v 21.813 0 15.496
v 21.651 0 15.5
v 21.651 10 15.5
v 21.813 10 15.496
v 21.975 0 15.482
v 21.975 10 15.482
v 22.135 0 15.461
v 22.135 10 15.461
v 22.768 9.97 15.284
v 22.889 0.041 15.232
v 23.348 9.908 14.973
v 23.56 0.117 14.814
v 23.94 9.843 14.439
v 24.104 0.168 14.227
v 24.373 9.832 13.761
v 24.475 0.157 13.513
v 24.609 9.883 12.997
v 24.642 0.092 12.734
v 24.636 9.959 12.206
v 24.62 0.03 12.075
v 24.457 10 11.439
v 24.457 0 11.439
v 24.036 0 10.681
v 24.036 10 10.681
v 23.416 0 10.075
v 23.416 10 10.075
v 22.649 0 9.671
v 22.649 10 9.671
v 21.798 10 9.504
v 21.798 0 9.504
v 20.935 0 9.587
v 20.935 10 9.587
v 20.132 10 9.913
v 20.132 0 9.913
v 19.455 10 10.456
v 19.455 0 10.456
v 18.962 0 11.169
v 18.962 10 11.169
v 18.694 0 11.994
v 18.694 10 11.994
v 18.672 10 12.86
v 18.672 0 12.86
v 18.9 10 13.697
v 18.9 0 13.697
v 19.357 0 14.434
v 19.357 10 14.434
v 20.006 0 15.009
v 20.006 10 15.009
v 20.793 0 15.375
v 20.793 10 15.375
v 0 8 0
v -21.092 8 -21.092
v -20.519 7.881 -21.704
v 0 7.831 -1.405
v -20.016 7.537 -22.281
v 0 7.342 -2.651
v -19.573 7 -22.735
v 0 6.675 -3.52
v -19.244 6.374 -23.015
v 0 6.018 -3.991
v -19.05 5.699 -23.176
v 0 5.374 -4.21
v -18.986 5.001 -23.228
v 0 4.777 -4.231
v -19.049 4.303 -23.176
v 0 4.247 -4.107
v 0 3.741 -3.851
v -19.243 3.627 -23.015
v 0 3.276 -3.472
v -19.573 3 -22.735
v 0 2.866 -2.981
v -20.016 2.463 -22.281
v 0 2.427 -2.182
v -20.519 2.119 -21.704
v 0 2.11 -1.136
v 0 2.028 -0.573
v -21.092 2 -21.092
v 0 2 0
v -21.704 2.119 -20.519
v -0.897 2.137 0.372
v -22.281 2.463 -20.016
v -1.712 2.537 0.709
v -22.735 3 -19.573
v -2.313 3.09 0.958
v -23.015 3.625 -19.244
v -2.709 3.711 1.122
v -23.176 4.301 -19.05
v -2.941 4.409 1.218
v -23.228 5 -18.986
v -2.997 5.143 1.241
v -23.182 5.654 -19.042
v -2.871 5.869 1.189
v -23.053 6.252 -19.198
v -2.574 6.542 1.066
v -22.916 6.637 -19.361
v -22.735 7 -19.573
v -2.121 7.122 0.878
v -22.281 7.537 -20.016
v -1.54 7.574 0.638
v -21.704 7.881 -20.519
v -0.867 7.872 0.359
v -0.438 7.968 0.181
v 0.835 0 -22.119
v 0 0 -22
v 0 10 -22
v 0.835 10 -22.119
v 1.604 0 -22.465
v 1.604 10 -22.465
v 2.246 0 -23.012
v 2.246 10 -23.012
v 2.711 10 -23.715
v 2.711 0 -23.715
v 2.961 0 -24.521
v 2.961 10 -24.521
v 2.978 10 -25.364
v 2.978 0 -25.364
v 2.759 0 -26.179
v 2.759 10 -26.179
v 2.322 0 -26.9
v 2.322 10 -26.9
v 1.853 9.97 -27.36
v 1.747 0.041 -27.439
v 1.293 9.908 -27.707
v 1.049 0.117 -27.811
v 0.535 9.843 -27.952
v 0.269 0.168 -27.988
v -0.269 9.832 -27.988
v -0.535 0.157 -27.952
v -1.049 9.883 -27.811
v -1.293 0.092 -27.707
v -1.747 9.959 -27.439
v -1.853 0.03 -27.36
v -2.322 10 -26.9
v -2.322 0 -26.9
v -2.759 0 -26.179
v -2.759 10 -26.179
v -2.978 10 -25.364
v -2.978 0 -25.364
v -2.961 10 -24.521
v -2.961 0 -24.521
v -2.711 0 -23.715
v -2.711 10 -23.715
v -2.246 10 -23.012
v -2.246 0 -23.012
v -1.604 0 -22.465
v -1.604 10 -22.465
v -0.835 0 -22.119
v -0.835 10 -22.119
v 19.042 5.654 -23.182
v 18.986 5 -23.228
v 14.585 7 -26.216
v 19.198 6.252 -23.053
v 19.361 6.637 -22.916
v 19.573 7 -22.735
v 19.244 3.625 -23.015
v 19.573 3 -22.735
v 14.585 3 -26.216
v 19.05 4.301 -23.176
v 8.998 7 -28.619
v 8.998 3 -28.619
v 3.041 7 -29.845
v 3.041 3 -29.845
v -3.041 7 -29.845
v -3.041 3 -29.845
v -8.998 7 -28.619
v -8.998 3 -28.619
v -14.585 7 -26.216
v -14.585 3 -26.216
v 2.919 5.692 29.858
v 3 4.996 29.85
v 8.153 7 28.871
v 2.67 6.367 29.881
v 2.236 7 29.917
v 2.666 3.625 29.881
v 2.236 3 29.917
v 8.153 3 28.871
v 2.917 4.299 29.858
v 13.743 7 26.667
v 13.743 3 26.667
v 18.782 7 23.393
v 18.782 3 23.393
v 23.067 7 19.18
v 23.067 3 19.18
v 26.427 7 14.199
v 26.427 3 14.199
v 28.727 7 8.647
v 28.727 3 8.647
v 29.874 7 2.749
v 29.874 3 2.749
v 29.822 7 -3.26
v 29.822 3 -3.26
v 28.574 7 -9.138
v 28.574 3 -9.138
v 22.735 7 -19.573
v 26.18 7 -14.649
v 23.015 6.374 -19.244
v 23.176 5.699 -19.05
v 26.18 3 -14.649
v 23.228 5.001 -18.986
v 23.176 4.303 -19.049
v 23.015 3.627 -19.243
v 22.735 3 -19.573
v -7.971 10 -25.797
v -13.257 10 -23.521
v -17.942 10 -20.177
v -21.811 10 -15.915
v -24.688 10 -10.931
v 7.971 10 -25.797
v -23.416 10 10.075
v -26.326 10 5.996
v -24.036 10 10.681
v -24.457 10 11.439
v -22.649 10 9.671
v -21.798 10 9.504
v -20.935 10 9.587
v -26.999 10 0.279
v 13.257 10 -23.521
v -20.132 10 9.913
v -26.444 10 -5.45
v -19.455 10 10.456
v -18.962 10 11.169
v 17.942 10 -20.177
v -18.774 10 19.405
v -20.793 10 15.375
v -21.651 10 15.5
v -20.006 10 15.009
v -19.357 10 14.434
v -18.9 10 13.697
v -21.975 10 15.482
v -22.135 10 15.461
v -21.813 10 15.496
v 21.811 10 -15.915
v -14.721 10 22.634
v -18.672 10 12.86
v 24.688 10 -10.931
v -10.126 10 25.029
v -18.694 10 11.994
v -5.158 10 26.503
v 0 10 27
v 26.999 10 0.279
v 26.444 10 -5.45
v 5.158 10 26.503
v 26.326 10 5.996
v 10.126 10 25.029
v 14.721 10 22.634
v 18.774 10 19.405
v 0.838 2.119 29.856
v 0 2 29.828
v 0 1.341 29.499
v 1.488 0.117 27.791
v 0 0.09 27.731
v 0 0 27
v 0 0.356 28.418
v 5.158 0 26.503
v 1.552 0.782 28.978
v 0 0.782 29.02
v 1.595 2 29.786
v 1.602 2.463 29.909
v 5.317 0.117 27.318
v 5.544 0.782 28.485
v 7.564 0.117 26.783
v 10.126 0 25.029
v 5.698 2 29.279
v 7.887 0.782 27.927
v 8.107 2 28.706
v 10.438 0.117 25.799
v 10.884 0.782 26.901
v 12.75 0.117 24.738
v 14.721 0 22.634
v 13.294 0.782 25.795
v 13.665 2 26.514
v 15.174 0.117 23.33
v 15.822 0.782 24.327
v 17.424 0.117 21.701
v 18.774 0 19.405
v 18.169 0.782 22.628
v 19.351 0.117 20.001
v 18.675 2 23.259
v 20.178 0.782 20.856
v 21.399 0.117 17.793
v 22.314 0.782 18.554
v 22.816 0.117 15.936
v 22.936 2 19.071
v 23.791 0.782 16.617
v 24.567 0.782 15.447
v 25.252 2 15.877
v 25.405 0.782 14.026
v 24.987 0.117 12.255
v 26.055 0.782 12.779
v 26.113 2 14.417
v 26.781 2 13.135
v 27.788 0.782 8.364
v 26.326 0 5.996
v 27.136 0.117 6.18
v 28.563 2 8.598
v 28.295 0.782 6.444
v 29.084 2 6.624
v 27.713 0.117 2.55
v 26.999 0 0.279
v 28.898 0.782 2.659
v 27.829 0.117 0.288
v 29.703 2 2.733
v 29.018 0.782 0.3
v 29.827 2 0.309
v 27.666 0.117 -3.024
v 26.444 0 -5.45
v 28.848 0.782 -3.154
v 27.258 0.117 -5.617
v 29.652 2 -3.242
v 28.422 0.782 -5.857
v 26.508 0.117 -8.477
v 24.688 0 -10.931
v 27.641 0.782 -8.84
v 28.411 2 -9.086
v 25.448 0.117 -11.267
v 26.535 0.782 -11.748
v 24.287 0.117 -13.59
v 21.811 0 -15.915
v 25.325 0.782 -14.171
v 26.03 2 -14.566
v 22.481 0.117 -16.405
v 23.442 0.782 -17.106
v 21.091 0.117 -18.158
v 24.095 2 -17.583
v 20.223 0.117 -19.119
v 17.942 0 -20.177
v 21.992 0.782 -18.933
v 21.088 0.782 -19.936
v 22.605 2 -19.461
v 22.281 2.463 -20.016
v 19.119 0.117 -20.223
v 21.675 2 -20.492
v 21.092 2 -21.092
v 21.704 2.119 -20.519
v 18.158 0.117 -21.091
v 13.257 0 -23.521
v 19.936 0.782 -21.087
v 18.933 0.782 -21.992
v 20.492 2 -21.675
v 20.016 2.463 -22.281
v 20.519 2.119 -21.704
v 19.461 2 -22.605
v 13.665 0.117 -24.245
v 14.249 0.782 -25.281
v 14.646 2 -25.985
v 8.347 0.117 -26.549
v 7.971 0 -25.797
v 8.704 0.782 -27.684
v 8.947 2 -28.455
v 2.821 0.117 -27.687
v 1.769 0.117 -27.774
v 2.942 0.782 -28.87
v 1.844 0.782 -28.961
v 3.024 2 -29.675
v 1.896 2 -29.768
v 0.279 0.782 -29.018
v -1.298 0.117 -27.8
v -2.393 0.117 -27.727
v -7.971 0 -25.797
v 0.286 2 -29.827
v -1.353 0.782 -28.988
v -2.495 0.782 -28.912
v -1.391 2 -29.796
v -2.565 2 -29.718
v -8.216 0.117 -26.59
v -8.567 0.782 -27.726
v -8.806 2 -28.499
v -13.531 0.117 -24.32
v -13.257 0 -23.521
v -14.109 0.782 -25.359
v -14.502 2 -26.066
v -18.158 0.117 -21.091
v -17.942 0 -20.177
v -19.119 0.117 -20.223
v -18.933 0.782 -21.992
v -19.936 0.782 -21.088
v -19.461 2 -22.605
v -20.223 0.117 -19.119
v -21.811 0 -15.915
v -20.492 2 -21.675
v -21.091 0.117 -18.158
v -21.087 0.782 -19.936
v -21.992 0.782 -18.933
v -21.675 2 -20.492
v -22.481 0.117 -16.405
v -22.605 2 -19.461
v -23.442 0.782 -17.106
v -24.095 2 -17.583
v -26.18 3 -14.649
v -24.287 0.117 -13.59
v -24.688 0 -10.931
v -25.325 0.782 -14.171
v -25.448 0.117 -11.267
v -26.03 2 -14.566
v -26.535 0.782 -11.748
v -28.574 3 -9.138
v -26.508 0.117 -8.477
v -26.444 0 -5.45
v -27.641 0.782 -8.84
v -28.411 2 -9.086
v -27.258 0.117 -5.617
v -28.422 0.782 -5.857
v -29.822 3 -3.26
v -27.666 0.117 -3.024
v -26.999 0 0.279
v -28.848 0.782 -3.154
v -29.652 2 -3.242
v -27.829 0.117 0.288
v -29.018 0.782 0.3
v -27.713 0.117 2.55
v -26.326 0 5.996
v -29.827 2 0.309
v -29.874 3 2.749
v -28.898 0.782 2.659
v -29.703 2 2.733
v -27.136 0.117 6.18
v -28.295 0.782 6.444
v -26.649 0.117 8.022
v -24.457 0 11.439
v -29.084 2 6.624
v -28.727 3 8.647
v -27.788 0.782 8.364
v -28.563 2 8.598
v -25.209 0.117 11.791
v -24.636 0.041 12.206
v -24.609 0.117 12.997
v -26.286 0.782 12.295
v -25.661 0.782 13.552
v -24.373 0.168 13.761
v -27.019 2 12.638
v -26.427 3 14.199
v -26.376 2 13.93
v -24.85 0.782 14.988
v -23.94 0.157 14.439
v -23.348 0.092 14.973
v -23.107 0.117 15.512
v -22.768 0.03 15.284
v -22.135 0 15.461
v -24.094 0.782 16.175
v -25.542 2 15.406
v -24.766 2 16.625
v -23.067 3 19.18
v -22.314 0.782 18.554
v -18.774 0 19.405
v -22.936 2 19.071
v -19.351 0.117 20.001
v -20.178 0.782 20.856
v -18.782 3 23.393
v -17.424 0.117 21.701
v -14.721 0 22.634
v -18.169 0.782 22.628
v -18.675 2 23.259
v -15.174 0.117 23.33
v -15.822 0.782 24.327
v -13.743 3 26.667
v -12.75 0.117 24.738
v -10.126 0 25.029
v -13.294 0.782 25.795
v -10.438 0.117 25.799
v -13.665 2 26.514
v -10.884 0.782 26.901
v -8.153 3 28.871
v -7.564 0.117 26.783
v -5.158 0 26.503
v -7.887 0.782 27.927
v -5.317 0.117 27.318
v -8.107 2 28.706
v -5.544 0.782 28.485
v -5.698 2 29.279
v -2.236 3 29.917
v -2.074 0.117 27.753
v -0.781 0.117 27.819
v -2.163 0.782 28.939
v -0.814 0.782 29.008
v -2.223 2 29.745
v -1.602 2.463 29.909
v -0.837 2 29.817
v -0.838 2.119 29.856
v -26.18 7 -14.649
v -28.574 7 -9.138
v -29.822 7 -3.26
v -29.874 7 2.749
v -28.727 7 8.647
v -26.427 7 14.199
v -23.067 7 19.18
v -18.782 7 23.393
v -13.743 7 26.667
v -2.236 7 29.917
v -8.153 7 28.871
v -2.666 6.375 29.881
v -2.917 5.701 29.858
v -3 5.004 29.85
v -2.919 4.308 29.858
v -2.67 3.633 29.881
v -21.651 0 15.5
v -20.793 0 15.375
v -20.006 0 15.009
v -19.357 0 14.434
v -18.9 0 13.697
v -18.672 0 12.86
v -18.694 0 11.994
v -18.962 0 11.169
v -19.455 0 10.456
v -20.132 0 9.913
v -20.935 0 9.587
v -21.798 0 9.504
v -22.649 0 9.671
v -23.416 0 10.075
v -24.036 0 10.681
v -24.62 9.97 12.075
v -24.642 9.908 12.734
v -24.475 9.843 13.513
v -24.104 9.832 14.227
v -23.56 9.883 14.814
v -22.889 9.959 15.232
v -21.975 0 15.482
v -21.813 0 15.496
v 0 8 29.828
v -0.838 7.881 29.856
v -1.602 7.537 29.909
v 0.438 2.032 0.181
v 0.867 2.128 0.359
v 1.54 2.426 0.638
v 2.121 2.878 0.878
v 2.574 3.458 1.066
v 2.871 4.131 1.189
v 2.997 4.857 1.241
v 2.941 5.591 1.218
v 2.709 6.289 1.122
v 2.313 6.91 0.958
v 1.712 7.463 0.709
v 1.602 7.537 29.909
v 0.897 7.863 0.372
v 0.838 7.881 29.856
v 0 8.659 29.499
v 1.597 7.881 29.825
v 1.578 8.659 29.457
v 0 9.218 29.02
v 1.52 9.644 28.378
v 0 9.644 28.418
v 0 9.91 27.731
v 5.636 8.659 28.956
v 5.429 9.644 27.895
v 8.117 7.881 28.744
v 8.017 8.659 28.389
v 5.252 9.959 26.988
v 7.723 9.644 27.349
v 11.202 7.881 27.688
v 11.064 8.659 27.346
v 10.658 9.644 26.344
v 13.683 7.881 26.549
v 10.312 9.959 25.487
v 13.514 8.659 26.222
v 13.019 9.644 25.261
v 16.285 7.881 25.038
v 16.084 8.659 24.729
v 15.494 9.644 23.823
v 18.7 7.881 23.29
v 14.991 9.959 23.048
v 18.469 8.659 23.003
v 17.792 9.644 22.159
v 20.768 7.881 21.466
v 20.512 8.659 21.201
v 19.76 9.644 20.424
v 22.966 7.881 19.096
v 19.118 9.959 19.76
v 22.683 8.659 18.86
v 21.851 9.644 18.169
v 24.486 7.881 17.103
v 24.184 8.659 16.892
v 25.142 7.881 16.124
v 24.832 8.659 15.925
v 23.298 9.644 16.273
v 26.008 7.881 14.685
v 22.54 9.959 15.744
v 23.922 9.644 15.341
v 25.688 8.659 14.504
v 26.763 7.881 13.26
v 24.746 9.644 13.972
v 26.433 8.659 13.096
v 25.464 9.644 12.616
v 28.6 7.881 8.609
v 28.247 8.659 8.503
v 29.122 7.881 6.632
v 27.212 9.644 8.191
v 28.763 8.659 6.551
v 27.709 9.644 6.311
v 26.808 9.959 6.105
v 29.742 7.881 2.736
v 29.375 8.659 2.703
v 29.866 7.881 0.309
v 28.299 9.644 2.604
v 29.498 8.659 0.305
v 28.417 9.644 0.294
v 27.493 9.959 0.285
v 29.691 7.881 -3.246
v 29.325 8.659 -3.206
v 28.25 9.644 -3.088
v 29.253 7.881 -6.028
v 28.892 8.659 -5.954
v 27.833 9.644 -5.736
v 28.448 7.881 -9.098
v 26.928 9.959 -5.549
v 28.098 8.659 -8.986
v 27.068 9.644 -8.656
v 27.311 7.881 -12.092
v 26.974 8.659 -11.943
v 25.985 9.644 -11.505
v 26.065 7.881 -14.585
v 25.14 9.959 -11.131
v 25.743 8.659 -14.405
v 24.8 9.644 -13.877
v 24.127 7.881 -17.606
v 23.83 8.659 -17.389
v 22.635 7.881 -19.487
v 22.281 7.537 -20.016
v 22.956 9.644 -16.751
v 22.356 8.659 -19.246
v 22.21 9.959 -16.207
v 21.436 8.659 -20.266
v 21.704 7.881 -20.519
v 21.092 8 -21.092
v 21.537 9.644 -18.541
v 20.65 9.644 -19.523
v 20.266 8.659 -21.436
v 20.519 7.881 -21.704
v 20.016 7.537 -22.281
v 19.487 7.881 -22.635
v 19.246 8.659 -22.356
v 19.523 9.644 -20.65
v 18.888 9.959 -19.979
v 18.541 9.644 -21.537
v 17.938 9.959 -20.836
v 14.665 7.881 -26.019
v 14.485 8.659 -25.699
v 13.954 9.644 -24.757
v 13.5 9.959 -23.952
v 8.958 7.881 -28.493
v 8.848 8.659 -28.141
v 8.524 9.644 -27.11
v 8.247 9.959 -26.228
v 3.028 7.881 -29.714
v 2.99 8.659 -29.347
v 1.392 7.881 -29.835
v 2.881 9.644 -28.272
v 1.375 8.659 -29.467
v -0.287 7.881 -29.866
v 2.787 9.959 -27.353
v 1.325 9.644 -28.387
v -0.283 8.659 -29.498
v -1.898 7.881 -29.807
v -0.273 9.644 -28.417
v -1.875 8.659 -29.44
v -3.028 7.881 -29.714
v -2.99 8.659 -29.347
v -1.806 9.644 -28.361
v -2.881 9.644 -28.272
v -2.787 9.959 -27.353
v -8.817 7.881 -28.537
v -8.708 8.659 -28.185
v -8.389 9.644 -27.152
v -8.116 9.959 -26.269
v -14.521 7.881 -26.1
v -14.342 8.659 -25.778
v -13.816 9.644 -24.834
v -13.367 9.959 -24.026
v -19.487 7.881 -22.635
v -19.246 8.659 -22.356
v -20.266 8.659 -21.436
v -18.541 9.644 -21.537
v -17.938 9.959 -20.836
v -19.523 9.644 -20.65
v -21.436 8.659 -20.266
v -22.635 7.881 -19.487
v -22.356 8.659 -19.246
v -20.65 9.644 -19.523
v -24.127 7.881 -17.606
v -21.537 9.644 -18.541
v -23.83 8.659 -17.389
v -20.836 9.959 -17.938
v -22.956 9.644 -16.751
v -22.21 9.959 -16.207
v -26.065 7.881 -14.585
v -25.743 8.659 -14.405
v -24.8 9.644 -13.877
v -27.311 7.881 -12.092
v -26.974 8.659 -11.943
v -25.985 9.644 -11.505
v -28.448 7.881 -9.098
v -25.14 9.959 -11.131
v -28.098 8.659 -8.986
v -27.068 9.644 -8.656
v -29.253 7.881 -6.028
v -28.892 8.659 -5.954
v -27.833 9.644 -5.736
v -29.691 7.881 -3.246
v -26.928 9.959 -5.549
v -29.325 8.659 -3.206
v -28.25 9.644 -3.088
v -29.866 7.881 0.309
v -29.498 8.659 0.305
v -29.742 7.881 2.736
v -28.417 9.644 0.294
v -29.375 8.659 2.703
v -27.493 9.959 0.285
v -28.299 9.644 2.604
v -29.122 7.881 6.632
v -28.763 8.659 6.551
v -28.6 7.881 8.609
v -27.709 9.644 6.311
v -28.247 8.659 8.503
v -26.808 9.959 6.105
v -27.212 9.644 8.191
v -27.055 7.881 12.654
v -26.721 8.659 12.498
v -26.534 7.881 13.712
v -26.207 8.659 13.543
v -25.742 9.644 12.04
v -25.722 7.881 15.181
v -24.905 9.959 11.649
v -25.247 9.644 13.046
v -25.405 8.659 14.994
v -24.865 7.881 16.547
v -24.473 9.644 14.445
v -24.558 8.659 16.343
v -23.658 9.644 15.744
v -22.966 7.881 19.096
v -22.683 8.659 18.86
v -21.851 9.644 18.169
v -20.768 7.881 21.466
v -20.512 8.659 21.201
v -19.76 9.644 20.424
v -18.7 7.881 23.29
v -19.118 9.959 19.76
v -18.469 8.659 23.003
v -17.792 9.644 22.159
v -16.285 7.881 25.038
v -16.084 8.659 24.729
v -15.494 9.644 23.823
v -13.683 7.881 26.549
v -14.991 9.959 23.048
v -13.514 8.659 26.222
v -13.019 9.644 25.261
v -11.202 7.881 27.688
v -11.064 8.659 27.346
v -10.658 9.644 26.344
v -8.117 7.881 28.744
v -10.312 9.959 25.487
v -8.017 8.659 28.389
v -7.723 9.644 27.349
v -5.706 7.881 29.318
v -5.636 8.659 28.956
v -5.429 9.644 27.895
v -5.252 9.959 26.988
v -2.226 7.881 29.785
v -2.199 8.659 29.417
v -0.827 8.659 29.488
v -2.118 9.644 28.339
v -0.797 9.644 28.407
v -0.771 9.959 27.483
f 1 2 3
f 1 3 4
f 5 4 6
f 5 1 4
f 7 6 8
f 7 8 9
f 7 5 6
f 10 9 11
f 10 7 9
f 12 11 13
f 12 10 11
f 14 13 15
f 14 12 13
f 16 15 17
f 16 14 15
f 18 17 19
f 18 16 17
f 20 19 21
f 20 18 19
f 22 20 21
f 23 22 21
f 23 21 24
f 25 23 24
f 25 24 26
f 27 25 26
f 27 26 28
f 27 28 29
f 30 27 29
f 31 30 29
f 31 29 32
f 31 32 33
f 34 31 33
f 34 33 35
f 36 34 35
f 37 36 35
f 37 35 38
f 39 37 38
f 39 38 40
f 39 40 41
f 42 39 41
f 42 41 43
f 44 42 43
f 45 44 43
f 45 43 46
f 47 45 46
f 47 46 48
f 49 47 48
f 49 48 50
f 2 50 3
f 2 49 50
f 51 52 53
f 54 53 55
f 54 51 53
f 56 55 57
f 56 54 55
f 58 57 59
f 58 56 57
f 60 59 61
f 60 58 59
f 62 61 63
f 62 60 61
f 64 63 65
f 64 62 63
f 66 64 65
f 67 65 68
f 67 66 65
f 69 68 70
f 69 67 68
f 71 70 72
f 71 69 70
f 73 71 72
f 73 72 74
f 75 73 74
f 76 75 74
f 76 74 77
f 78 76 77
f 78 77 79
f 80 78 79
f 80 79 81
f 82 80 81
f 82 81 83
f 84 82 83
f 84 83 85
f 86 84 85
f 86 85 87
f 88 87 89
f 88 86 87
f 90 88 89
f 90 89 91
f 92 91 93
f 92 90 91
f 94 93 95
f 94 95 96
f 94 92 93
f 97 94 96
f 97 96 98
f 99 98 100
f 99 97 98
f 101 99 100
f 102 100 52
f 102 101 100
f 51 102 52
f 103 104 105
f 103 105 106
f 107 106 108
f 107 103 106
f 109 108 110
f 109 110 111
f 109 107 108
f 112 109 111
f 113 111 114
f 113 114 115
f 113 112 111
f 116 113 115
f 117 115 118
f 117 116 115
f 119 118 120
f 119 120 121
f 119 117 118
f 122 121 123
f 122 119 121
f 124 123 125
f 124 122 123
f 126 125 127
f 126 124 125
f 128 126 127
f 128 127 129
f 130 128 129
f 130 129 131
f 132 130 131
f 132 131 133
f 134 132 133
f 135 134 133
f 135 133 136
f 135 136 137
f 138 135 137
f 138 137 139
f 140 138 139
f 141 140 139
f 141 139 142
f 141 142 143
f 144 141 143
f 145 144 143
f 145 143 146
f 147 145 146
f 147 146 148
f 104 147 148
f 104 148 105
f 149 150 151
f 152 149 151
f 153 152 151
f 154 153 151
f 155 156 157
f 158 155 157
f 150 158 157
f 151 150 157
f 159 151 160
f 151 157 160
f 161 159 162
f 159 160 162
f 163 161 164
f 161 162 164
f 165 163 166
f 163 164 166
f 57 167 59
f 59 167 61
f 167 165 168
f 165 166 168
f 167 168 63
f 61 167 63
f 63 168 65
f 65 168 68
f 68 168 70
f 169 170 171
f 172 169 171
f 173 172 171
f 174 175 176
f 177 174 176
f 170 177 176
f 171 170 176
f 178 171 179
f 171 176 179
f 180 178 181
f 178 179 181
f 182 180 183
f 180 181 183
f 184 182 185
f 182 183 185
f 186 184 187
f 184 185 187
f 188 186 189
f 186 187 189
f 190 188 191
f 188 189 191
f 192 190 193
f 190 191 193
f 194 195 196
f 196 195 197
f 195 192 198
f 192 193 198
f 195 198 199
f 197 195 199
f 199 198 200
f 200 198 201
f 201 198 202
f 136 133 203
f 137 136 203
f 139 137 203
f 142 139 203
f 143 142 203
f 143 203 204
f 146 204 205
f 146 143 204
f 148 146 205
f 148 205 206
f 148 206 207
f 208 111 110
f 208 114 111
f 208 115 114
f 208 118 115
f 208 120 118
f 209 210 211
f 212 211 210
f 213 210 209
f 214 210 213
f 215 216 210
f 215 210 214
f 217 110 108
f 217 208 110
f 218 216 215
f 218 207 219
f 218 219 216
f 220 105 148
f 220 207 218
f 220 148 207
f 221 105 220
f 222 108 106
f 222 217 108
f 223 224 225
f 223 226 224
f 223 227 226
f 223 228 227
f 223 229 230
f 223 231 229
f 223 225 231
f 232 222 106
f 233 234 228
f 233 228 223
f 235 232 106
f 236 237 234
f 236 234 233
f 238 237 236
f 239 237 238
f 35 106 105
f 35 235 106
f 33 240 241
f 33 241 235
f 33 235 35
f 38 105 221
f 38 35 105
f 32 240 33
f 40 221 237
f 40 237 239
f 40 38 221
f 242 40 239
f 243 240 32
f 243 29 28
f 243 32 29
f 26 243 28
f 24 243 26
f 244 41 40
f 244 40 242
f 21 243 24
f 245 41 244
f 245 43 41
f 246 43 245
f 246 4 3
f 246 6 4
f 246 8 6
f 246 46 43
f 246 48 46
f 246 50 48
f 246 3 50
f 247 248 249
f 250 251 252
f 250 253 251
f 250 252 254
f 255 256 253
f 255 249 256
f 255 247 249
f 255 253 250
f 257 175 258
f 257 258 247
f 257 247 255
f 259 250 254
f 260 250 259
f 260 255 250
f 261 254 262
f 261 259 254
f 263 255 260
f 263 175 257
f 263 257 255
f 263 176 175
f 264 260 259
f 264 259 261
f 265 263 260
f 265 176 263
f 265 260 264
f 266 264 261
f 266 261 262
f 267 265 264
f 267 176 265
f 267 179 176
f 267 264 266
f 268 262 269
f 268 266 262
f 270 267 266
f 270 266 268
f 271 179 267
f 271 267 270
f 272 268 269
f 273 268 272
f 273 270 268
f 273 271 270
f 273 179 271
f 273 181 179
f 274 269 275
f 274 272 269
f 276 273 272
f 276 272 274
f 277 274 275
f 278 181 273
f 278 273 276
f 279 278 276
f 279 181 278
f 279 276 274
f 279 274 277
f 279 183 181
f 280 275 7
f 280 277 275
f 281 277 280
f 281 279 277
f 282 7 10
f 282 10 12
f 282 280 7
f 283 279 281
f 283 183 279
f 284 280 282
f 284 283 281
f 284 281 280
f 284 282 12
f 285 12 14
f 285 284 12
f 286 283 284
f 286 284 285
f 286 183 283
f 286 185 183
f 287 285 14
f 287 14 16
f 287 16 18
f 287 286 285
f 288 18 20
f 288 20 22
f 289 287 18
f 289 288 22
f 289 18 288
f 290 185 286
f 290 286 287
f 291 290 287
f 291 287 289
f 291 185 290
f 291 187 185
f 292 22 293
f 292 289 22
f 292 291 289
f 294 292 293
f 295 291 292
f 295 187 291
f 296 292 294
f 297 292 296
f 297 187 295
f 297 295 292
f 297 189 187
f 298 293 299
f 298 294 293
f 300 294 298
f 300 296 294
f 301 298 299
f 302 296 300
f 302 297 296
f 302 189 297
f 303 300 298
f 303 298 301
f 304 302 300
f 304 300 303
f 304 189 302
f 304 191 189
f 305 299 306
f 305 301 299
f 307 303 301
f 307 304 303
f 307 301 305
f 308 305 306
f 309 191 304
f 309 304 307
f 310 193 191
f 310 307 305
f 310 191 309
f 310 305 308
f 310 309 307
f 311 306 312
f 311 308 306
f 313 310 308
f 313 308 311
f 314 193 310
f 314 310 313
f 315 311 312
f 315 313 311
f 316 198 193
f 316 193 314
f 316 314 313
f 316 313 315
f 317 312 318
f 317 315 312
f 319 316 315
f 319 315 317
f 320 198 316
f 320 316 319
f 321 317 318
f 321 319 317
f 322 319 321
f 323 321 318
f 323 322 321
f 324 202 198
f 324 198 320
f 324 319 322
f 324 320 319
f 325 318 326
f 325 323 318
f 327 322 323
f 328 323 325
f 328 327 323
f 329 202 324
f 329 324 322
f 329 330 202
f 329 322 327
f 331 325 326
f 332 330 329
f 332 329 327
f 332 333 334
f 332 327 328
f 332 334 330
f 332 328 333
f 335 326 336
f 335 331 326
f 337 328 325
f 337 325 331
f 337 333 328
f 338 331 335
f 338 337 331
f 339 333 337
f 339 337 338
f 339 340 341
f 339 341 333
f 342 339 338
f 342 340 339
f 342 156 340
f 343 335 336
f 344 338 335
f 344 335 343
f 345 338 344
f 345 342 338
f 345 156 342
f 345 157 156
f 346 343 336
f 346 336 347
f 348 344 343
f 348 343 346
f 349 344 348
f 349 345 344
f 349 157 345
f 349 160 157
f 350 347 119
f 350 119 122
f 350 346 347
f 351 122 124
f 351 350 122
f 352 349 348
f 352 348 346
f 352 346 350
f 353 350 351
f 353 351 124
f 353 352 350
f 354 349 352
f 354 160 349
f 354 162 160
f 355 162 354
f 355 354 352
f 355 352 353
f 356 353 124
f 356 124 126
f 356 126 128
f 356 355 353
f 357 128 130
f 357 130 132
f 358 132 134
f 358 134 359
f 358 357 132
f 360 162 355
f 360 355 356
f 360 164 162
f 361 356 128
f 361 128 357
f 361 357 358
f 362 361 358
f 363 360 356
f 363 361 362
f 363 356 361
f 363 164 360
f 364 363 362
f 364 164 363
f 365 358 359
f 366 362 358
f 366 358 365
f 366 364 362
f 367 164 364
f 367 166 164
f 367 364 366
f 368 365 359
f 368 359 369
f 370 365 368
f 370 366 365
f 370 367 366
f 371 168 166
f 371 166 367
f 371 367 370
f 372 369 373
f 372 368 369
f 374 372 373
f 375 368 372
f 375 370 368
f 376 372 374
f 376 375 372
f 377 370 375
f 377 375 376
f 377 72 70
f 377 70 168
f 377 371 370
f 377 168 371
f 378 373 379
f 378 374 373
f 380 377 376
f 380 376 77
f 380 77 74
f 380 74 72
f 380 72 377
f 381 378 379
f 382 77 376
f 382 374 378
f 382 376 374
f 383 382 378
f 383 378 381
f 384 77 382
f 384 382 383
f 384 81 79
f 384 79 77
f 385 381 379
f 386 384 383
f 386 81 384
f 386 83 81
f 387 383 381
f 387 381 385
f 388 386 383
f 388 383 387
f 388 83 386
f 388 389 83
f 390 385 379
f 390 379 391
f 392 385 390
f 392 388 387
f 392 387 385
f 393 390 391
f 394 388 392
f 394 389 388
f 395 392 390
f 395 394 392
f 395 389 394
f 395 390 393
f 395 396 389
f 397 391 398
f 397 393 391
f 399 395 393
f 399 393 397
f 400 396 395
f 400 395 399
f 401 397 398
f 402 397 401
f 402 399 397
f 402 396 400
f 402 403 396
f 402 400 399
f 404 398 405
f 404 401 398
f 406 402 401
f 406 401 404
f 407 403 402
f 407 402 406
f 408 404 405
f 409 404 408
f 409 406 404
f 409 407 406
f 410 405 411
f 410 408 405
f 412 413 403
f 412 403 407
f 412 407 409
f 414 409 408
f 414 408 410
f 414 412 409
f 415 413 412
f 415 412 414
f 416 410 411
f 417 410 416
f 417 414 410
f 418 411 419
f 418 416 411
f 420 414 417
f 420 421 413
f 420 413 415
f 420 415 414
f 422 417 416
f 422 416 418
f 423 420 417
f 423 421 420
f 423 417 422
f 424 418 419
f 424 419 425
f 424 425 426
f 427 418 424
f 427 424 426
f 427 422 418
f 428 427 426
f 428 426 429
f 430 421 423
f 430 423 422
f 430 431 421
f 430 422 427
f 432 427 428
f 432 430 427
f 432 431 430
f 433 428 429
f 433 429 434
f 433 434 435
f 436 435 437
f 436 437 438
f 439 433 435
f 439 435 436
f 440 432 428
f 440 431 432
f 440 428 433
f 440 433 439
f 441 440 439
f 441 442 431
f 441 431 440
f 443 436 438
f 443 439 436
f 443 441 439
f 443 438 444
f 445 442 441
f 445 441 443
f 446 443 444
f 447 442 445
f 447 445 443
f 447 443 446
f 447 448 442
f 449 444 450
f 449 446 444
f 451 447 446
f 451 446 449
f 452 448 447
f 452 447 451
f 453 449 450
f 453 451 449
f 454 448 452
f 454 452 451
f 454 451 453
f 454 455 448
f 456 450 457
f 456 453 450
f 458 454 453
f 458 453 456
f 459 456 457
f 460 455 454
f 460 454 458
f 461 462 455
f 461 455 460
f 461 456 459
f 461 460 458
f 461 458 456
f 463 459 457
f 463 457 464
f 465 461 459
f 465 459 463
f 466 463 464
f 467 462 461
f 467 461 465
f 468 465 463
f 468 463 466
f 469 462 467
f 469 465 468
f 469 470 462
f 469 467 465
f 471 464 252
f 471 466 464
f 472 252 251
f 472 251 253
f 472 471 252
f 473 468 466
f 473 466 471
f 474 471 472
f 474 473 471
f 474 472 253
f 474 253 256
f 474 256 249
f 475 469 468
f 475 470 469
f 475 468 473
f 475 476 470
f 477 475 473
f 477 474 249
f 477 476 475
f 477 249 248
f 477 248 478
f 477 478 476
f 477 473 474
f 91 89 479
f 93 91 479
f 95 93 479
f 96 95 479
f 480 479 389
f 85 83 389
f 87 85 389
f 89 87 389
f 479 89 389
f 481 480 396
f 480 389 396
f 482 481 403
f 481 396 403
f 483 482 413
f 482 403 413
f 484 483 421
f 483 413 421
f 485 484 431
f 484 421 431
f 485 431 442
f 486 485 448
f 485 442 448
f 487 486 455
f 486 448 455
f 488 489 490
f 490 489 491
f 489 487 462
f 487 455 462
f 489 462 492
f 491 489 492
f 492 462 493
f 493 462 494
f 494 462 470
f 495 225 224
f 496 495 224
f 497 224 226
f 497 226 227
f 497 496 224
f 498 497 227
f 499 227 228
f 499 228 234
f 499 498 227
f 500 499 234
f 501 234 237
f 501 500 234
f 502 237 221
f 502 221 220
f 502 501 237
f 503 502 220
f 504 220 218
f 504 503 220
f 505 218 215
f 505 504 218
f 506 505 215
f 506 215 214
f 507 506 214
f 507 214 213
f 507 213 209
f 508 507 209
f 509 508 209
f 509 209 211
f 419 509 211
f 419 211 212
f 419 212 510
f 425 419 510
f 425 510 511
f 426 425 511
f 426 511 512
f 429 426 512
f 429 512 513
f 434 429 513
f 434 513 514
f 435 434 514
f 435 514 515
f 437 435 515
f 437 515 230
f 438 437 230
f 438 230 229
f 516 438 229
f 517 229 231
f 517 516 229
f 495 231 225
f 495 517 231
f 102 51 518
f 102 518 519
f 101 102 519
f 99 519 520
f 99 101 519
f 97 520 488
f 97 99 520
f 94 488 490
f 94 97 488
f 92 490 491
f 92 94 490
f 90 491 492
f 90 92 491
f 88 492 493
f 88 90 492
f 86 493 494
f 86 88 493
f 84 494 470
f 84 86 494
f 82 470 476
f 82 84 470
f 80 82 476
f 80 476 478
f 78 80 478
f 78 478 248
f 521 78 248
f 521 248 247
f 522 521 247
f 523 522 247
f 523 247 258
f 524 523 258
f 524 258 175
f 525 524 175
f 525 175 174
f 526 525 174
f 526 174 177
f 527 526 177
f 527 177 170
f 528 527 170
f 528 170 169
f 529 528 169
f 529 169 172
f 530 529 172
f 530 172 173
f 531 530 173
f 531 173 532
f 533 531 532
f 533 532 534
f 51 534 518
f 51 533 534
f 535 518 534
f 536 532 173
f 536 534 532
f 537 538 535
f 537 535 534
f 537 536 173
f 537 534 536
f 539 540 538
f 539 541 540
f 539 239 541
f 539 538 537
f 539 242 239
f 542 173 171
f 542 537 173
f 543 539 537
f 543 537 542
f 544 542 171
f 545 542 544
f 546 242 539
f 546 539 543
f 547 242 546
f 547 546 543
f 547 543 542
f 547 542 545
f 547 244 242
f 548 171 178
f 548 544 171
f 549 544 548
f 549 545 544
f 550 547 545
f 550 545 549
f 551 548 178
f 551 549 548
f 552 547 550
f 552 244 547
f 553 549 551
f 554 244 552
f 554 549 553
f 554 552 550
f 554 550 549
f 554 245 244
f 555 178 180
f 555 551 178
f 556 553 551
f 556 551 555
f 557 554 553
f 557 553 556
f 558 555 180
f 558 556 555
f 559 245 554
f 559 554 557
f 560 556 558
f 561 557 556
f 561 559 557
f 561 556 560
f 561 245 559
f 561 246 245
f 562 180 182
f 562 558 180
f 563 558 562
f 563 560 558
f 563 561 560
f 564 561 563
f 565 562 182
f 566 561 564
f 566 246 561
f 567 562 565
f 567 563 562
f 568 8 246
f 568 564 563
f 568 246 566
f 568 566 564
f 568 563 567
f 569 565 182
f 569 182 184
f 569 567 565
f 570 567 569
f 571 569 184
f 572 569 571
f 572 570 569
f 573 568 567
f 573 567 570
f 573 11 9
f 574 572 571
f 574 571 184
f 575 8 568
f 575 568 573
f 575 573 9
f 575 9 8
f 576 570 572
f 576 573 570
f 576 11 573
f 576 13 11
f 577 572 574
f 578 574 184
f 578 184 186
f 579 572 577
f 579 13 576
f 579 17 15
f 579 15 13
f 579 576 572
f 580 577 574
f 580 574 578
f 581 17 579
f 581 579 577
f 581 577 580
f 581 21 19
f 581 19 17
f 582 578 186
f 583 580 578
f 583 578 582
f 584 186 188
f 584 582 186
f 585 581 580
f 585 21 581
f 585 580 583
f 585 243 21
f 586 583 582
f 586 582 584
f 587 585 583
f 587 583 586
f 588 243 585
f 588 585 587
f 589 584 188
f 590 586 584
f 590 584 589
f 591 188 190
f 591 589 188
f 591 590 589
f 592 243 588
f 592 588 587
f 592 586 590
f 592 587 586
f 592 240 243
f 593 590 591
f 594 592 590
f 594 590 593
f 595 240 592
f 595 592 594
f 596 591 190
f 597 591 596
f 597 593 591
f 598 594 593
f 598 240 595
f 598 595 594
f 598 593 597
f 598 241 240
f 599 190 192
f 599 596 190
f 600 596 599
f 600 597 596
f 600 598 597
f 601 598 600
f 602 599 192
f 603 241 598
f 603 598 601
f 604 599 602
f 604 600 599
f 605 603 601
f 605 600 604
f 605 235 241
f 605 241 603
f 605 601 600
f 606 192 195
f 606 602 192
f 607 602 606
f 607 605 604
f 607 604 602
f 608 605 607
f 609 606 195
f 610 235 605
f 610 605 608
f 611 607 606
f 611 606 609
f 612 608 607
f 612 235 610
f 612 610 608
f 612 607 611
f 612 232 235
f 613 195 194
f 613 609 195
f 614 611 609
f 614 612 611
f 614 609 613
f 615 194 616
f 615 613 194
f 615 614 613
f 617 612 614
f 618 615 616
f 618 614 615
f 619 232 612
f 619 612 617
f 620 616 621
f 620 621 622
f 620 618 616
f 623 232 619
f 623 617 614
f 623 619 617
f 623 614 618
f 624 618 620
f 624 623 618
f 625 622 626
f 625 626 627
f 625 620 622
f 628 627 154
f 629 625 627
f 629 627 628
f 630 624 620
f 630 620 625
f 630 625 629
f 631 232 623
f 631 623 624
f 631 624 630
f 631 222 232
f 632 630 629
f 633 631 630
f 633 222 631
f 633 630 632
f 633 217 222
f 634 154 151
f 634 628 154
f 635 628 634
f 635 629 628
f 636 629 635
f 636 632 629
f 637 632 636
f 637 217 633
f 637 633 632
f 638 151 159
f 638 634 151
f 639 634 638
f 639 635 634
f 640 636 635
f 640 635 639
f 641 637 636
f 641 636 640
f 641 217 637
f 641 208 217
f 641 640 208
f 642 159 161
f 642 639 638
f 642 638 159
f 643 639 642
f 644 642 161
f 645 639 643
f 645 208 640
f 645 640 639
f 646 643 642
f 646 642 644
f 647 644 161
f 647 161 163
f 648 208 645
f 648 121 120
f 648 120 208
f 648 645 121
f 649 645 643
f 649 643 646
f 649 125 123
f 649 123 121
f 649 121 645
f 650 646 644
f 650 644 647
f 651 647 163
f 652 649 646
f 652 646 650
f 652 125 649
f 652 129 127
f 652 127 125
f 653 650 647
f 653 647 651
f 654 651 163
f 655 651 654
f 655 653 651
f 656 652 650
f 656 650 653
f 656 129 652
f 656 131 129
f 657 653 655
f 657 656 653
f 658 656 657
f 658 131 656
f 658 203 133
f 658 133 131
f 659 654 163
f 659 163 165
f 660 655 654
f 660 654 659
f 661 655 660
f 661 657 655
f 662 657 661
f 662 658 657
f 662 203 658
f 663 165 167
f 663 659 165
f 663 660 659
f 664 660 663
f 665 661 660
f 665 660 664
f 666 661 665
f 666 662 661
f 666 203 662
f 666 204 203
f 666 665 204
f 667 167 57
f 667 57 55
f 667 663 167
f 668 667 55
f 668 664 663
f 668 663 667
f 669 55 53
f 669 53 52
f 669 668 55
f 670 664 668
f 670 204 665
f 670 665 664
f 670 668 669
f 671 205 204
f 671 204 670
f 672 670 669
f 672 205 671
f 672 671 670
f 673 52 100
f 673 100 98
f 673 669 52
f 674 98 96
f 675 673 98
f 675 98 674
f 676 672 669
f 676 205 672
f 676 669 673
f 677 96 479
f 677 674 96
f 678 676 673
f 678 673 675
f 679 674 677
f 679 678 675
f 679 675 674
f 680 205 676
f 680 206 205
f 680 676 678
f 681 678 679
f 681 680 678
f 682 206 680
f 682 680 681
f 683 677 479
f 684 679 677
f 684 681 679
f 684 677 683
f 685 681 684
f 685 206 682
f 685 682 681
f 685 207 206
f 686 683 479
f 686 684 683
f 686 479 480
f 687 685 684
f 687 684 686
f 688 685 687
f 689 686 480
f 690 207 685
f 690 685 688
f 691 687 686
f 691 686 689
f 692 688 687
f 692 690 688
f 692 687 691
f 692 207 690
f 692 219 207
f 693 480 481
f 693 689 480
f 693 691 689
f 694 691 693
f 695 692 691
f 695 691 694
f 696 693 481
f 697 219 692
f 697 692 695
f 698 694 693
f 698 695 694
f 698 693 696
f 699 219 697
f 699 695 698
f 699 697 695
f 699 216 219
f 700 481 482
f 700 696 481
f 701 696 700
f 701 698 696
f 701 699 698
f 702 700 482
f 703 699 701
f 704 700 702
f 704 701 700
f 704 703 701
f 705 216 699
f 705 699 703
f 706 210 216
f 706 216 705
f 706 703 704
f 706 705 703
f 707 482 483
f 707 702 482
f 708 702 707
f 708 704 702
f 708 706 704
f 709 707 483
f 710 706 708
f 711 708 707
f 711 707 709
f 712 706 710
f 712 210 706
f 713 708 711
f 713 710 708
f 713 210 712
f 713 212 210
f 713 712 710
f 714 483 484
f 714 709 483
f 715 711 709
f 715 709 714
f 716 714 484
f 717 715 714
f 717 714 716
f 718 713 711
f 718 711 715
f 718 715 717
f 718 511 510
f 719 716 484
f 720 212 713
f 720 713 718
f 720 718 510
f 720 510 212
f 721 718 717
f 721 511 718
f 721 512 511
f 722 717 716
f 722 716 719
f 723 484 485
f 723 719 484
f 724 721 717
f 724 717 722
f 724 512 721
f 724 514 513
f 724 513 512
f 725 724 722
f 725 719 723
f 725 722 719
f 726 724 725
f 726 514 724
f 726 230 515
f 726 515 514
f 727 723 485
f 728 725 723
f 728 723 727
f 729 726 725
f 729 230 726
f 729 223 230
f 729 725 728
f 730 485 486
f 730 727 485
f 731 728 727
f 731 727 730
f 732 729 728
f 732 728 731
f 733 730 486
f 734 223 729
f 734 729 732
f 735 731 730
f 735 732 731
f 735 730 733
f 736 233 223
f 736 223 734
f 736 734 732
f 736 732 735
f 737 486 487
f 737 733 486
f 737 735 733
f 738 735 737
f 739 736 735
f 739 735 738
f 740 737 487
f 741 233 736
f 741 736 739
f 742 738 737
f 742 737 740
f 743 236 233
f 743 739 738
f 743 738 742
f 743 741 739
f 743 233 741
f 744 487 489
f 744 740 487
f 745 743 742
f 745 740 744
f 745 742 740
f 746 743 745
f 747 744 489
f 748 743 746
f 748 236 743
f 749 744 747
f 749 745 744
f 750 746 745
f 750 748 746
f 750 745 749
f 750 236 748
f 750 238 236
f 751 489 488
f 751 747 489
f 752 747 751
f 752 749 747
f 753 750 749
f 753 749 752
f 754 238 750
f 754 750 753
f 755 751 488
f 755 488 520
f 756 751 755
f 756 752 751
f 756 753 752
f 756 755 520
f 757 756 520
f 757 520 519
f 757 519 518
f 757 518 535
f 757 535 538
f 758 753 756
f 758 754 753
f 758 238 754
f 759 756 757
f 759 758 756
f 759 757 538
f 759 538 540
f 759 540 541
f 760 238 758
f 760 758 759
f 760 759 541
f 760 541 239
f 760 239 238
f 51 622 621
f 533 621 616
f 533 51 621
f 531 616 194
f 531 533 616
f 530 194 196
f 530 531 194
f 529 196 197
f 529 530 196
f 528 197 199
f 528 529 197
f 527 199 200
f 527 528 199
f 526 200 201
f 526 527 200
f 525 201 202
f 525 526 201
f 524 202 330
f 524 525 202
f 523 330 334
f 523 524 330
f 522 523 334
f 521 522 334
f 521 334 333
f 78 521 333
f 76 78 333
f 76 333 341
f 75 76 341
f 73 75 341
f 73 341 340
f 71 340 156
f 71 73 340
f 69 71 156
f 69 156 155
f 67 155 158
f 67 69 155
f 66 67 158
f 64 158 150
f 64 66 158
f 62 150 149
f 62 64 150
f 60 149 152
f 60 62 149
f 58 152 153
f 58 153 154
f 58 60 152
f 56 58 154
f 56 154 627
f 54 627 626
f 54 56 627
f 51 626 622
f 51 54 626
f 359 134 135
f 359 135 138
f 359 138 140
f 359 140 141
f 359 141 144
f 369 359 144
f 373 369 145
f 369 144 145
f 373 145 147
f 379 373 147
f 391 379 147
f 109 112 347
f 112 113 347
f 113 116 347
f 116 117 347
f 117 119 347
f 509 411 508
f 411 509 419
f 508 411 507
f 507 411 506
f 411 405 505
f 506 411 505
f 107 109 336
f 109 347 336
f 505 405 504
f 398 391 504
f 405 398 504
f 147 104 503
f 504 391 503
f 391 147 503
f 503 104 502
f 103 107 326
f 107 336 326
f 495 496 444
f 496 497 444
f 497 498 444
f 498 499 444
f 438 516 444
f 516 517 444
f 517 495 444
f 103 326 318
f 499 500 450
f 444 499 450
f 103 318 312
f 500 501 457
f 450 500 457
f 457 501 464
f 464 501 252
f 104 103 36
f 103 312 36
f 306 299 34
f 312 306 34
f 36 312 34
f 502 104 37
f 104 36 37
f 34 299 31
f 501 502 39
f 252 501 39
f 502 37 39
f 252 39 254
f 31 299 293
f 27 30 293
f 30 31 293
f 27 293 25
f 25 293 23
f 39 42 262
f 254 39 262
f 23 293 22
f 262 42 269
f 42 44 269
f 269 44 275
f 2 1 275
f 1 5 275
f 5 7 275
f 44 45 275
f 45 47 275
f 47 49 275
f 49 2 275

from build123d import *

# Parameters (mm, degrees)
SKETCH1_R           = 30
SKETCH1_R_2         = 3
BOSS_EXTRUDE1_DEPTH = 10
SKETCH3_R           = 3
CUT_EXTRUDE1_DEPTH  = 44.588989435
CIRPATTERN1_COUNT   = 8
FILLET1_R           = 3


with BuildPart() as part:
    # Sketch1 → Boss-Extrude1 (new body)
    with BuildSketch(Plane(origin=(0, 0, 0), x_dir=(1, 0, 0), z_dir=(0, 1, 0))):
        with Locations(Location((0, 0, 0), (0, 0, 270))):
            Circle(SKETCH1_R)
        with Locations(Location((0, 25, 0), (0, 0, 270))):
            Circle(SKETCH1_R_2, mode=Mode.SUBTRACT)
        with Locations(Location((21.650635095, -12.5, 0), (0, 0, 270))):
            Circle(SKETCH1_R_2, mode=Mode.SUBTRACT)
        with Locations(Location((-21.650635095, -12.5, 0), (0, 0, 270))):
            Circle(SKETCH1_R_2, mode=Mode.SUBTRACT)
    extrude(amount=BOSS_EXTRUDE1_DEPTH)

    # Sketch3 → Cut-Extrude1 (cut, through all)
    with BuildSketch(Plane.XY):
        with Locations(Location((0, 5, 0), (0, 0, 90))):
            Circle(SKETCH3_R)
    cut_extrude1 = extrude(amount=CUT_EXTRUDE1_DEPTH, mode=Mode.SUBTRACT)

    # CirPattern1: Cut-Extrude1 ×8 about axis, 5 skipped
    cirpattern1_axis = Axis((0, 10, 0), (0, 1, 0))
    add([cut_extrude1.rotate(cirpattern1_axis, i * 360 / CIRPATTERN1_COUNT) for i in range(1, CIRPATTERN1_COUNT) if i not in (1, 2, 4, 6, 7)], mode=Mode.SUBTRACT)

    # Fillet1
    # the kernel refuses this fillet: 3 mm, written as the material it takes off along each edge
    with BuildSketch(Plane(origin=(0, 0, 0), x_dir=(0, 0, 1), z_dir=(-1, 0, 0))) as fillet1_piece_1:
        with BuildLine():
            CenterArc((30 - FILLET1_R, FILLET1_R), FILLET1_R, 270, 90)
            Line((30 - FILLET1_R, 0), (30, 0))
            Line((30, 0), (30, FILLET1_R))
        make_face()
    revolve(axis=Axis((0, 0, 0), (0, 1, 0)), mode=Mode.SUBTRACT)
    with BuildSketch(Plane(origin=(0, 10, 0), x_dir=(0, 0, 1), z_dir=(-1, 0, 0))) as fillet1_piece_2:
        with BuildLine():
            CenterArc((30 - FILLET1_R, -FILLET1_R), FILLET1_R, 0, 90)
            Line((30 - FILLET1_R, 0), (30, 0))
            Line((30, 0), (30, -FILLET1_R))
        make_face()
    revolve(axis=Axis((0, 10, 0), (0, 1, 0)), mode=Mode.SUBTRACT)


solid = part.part
